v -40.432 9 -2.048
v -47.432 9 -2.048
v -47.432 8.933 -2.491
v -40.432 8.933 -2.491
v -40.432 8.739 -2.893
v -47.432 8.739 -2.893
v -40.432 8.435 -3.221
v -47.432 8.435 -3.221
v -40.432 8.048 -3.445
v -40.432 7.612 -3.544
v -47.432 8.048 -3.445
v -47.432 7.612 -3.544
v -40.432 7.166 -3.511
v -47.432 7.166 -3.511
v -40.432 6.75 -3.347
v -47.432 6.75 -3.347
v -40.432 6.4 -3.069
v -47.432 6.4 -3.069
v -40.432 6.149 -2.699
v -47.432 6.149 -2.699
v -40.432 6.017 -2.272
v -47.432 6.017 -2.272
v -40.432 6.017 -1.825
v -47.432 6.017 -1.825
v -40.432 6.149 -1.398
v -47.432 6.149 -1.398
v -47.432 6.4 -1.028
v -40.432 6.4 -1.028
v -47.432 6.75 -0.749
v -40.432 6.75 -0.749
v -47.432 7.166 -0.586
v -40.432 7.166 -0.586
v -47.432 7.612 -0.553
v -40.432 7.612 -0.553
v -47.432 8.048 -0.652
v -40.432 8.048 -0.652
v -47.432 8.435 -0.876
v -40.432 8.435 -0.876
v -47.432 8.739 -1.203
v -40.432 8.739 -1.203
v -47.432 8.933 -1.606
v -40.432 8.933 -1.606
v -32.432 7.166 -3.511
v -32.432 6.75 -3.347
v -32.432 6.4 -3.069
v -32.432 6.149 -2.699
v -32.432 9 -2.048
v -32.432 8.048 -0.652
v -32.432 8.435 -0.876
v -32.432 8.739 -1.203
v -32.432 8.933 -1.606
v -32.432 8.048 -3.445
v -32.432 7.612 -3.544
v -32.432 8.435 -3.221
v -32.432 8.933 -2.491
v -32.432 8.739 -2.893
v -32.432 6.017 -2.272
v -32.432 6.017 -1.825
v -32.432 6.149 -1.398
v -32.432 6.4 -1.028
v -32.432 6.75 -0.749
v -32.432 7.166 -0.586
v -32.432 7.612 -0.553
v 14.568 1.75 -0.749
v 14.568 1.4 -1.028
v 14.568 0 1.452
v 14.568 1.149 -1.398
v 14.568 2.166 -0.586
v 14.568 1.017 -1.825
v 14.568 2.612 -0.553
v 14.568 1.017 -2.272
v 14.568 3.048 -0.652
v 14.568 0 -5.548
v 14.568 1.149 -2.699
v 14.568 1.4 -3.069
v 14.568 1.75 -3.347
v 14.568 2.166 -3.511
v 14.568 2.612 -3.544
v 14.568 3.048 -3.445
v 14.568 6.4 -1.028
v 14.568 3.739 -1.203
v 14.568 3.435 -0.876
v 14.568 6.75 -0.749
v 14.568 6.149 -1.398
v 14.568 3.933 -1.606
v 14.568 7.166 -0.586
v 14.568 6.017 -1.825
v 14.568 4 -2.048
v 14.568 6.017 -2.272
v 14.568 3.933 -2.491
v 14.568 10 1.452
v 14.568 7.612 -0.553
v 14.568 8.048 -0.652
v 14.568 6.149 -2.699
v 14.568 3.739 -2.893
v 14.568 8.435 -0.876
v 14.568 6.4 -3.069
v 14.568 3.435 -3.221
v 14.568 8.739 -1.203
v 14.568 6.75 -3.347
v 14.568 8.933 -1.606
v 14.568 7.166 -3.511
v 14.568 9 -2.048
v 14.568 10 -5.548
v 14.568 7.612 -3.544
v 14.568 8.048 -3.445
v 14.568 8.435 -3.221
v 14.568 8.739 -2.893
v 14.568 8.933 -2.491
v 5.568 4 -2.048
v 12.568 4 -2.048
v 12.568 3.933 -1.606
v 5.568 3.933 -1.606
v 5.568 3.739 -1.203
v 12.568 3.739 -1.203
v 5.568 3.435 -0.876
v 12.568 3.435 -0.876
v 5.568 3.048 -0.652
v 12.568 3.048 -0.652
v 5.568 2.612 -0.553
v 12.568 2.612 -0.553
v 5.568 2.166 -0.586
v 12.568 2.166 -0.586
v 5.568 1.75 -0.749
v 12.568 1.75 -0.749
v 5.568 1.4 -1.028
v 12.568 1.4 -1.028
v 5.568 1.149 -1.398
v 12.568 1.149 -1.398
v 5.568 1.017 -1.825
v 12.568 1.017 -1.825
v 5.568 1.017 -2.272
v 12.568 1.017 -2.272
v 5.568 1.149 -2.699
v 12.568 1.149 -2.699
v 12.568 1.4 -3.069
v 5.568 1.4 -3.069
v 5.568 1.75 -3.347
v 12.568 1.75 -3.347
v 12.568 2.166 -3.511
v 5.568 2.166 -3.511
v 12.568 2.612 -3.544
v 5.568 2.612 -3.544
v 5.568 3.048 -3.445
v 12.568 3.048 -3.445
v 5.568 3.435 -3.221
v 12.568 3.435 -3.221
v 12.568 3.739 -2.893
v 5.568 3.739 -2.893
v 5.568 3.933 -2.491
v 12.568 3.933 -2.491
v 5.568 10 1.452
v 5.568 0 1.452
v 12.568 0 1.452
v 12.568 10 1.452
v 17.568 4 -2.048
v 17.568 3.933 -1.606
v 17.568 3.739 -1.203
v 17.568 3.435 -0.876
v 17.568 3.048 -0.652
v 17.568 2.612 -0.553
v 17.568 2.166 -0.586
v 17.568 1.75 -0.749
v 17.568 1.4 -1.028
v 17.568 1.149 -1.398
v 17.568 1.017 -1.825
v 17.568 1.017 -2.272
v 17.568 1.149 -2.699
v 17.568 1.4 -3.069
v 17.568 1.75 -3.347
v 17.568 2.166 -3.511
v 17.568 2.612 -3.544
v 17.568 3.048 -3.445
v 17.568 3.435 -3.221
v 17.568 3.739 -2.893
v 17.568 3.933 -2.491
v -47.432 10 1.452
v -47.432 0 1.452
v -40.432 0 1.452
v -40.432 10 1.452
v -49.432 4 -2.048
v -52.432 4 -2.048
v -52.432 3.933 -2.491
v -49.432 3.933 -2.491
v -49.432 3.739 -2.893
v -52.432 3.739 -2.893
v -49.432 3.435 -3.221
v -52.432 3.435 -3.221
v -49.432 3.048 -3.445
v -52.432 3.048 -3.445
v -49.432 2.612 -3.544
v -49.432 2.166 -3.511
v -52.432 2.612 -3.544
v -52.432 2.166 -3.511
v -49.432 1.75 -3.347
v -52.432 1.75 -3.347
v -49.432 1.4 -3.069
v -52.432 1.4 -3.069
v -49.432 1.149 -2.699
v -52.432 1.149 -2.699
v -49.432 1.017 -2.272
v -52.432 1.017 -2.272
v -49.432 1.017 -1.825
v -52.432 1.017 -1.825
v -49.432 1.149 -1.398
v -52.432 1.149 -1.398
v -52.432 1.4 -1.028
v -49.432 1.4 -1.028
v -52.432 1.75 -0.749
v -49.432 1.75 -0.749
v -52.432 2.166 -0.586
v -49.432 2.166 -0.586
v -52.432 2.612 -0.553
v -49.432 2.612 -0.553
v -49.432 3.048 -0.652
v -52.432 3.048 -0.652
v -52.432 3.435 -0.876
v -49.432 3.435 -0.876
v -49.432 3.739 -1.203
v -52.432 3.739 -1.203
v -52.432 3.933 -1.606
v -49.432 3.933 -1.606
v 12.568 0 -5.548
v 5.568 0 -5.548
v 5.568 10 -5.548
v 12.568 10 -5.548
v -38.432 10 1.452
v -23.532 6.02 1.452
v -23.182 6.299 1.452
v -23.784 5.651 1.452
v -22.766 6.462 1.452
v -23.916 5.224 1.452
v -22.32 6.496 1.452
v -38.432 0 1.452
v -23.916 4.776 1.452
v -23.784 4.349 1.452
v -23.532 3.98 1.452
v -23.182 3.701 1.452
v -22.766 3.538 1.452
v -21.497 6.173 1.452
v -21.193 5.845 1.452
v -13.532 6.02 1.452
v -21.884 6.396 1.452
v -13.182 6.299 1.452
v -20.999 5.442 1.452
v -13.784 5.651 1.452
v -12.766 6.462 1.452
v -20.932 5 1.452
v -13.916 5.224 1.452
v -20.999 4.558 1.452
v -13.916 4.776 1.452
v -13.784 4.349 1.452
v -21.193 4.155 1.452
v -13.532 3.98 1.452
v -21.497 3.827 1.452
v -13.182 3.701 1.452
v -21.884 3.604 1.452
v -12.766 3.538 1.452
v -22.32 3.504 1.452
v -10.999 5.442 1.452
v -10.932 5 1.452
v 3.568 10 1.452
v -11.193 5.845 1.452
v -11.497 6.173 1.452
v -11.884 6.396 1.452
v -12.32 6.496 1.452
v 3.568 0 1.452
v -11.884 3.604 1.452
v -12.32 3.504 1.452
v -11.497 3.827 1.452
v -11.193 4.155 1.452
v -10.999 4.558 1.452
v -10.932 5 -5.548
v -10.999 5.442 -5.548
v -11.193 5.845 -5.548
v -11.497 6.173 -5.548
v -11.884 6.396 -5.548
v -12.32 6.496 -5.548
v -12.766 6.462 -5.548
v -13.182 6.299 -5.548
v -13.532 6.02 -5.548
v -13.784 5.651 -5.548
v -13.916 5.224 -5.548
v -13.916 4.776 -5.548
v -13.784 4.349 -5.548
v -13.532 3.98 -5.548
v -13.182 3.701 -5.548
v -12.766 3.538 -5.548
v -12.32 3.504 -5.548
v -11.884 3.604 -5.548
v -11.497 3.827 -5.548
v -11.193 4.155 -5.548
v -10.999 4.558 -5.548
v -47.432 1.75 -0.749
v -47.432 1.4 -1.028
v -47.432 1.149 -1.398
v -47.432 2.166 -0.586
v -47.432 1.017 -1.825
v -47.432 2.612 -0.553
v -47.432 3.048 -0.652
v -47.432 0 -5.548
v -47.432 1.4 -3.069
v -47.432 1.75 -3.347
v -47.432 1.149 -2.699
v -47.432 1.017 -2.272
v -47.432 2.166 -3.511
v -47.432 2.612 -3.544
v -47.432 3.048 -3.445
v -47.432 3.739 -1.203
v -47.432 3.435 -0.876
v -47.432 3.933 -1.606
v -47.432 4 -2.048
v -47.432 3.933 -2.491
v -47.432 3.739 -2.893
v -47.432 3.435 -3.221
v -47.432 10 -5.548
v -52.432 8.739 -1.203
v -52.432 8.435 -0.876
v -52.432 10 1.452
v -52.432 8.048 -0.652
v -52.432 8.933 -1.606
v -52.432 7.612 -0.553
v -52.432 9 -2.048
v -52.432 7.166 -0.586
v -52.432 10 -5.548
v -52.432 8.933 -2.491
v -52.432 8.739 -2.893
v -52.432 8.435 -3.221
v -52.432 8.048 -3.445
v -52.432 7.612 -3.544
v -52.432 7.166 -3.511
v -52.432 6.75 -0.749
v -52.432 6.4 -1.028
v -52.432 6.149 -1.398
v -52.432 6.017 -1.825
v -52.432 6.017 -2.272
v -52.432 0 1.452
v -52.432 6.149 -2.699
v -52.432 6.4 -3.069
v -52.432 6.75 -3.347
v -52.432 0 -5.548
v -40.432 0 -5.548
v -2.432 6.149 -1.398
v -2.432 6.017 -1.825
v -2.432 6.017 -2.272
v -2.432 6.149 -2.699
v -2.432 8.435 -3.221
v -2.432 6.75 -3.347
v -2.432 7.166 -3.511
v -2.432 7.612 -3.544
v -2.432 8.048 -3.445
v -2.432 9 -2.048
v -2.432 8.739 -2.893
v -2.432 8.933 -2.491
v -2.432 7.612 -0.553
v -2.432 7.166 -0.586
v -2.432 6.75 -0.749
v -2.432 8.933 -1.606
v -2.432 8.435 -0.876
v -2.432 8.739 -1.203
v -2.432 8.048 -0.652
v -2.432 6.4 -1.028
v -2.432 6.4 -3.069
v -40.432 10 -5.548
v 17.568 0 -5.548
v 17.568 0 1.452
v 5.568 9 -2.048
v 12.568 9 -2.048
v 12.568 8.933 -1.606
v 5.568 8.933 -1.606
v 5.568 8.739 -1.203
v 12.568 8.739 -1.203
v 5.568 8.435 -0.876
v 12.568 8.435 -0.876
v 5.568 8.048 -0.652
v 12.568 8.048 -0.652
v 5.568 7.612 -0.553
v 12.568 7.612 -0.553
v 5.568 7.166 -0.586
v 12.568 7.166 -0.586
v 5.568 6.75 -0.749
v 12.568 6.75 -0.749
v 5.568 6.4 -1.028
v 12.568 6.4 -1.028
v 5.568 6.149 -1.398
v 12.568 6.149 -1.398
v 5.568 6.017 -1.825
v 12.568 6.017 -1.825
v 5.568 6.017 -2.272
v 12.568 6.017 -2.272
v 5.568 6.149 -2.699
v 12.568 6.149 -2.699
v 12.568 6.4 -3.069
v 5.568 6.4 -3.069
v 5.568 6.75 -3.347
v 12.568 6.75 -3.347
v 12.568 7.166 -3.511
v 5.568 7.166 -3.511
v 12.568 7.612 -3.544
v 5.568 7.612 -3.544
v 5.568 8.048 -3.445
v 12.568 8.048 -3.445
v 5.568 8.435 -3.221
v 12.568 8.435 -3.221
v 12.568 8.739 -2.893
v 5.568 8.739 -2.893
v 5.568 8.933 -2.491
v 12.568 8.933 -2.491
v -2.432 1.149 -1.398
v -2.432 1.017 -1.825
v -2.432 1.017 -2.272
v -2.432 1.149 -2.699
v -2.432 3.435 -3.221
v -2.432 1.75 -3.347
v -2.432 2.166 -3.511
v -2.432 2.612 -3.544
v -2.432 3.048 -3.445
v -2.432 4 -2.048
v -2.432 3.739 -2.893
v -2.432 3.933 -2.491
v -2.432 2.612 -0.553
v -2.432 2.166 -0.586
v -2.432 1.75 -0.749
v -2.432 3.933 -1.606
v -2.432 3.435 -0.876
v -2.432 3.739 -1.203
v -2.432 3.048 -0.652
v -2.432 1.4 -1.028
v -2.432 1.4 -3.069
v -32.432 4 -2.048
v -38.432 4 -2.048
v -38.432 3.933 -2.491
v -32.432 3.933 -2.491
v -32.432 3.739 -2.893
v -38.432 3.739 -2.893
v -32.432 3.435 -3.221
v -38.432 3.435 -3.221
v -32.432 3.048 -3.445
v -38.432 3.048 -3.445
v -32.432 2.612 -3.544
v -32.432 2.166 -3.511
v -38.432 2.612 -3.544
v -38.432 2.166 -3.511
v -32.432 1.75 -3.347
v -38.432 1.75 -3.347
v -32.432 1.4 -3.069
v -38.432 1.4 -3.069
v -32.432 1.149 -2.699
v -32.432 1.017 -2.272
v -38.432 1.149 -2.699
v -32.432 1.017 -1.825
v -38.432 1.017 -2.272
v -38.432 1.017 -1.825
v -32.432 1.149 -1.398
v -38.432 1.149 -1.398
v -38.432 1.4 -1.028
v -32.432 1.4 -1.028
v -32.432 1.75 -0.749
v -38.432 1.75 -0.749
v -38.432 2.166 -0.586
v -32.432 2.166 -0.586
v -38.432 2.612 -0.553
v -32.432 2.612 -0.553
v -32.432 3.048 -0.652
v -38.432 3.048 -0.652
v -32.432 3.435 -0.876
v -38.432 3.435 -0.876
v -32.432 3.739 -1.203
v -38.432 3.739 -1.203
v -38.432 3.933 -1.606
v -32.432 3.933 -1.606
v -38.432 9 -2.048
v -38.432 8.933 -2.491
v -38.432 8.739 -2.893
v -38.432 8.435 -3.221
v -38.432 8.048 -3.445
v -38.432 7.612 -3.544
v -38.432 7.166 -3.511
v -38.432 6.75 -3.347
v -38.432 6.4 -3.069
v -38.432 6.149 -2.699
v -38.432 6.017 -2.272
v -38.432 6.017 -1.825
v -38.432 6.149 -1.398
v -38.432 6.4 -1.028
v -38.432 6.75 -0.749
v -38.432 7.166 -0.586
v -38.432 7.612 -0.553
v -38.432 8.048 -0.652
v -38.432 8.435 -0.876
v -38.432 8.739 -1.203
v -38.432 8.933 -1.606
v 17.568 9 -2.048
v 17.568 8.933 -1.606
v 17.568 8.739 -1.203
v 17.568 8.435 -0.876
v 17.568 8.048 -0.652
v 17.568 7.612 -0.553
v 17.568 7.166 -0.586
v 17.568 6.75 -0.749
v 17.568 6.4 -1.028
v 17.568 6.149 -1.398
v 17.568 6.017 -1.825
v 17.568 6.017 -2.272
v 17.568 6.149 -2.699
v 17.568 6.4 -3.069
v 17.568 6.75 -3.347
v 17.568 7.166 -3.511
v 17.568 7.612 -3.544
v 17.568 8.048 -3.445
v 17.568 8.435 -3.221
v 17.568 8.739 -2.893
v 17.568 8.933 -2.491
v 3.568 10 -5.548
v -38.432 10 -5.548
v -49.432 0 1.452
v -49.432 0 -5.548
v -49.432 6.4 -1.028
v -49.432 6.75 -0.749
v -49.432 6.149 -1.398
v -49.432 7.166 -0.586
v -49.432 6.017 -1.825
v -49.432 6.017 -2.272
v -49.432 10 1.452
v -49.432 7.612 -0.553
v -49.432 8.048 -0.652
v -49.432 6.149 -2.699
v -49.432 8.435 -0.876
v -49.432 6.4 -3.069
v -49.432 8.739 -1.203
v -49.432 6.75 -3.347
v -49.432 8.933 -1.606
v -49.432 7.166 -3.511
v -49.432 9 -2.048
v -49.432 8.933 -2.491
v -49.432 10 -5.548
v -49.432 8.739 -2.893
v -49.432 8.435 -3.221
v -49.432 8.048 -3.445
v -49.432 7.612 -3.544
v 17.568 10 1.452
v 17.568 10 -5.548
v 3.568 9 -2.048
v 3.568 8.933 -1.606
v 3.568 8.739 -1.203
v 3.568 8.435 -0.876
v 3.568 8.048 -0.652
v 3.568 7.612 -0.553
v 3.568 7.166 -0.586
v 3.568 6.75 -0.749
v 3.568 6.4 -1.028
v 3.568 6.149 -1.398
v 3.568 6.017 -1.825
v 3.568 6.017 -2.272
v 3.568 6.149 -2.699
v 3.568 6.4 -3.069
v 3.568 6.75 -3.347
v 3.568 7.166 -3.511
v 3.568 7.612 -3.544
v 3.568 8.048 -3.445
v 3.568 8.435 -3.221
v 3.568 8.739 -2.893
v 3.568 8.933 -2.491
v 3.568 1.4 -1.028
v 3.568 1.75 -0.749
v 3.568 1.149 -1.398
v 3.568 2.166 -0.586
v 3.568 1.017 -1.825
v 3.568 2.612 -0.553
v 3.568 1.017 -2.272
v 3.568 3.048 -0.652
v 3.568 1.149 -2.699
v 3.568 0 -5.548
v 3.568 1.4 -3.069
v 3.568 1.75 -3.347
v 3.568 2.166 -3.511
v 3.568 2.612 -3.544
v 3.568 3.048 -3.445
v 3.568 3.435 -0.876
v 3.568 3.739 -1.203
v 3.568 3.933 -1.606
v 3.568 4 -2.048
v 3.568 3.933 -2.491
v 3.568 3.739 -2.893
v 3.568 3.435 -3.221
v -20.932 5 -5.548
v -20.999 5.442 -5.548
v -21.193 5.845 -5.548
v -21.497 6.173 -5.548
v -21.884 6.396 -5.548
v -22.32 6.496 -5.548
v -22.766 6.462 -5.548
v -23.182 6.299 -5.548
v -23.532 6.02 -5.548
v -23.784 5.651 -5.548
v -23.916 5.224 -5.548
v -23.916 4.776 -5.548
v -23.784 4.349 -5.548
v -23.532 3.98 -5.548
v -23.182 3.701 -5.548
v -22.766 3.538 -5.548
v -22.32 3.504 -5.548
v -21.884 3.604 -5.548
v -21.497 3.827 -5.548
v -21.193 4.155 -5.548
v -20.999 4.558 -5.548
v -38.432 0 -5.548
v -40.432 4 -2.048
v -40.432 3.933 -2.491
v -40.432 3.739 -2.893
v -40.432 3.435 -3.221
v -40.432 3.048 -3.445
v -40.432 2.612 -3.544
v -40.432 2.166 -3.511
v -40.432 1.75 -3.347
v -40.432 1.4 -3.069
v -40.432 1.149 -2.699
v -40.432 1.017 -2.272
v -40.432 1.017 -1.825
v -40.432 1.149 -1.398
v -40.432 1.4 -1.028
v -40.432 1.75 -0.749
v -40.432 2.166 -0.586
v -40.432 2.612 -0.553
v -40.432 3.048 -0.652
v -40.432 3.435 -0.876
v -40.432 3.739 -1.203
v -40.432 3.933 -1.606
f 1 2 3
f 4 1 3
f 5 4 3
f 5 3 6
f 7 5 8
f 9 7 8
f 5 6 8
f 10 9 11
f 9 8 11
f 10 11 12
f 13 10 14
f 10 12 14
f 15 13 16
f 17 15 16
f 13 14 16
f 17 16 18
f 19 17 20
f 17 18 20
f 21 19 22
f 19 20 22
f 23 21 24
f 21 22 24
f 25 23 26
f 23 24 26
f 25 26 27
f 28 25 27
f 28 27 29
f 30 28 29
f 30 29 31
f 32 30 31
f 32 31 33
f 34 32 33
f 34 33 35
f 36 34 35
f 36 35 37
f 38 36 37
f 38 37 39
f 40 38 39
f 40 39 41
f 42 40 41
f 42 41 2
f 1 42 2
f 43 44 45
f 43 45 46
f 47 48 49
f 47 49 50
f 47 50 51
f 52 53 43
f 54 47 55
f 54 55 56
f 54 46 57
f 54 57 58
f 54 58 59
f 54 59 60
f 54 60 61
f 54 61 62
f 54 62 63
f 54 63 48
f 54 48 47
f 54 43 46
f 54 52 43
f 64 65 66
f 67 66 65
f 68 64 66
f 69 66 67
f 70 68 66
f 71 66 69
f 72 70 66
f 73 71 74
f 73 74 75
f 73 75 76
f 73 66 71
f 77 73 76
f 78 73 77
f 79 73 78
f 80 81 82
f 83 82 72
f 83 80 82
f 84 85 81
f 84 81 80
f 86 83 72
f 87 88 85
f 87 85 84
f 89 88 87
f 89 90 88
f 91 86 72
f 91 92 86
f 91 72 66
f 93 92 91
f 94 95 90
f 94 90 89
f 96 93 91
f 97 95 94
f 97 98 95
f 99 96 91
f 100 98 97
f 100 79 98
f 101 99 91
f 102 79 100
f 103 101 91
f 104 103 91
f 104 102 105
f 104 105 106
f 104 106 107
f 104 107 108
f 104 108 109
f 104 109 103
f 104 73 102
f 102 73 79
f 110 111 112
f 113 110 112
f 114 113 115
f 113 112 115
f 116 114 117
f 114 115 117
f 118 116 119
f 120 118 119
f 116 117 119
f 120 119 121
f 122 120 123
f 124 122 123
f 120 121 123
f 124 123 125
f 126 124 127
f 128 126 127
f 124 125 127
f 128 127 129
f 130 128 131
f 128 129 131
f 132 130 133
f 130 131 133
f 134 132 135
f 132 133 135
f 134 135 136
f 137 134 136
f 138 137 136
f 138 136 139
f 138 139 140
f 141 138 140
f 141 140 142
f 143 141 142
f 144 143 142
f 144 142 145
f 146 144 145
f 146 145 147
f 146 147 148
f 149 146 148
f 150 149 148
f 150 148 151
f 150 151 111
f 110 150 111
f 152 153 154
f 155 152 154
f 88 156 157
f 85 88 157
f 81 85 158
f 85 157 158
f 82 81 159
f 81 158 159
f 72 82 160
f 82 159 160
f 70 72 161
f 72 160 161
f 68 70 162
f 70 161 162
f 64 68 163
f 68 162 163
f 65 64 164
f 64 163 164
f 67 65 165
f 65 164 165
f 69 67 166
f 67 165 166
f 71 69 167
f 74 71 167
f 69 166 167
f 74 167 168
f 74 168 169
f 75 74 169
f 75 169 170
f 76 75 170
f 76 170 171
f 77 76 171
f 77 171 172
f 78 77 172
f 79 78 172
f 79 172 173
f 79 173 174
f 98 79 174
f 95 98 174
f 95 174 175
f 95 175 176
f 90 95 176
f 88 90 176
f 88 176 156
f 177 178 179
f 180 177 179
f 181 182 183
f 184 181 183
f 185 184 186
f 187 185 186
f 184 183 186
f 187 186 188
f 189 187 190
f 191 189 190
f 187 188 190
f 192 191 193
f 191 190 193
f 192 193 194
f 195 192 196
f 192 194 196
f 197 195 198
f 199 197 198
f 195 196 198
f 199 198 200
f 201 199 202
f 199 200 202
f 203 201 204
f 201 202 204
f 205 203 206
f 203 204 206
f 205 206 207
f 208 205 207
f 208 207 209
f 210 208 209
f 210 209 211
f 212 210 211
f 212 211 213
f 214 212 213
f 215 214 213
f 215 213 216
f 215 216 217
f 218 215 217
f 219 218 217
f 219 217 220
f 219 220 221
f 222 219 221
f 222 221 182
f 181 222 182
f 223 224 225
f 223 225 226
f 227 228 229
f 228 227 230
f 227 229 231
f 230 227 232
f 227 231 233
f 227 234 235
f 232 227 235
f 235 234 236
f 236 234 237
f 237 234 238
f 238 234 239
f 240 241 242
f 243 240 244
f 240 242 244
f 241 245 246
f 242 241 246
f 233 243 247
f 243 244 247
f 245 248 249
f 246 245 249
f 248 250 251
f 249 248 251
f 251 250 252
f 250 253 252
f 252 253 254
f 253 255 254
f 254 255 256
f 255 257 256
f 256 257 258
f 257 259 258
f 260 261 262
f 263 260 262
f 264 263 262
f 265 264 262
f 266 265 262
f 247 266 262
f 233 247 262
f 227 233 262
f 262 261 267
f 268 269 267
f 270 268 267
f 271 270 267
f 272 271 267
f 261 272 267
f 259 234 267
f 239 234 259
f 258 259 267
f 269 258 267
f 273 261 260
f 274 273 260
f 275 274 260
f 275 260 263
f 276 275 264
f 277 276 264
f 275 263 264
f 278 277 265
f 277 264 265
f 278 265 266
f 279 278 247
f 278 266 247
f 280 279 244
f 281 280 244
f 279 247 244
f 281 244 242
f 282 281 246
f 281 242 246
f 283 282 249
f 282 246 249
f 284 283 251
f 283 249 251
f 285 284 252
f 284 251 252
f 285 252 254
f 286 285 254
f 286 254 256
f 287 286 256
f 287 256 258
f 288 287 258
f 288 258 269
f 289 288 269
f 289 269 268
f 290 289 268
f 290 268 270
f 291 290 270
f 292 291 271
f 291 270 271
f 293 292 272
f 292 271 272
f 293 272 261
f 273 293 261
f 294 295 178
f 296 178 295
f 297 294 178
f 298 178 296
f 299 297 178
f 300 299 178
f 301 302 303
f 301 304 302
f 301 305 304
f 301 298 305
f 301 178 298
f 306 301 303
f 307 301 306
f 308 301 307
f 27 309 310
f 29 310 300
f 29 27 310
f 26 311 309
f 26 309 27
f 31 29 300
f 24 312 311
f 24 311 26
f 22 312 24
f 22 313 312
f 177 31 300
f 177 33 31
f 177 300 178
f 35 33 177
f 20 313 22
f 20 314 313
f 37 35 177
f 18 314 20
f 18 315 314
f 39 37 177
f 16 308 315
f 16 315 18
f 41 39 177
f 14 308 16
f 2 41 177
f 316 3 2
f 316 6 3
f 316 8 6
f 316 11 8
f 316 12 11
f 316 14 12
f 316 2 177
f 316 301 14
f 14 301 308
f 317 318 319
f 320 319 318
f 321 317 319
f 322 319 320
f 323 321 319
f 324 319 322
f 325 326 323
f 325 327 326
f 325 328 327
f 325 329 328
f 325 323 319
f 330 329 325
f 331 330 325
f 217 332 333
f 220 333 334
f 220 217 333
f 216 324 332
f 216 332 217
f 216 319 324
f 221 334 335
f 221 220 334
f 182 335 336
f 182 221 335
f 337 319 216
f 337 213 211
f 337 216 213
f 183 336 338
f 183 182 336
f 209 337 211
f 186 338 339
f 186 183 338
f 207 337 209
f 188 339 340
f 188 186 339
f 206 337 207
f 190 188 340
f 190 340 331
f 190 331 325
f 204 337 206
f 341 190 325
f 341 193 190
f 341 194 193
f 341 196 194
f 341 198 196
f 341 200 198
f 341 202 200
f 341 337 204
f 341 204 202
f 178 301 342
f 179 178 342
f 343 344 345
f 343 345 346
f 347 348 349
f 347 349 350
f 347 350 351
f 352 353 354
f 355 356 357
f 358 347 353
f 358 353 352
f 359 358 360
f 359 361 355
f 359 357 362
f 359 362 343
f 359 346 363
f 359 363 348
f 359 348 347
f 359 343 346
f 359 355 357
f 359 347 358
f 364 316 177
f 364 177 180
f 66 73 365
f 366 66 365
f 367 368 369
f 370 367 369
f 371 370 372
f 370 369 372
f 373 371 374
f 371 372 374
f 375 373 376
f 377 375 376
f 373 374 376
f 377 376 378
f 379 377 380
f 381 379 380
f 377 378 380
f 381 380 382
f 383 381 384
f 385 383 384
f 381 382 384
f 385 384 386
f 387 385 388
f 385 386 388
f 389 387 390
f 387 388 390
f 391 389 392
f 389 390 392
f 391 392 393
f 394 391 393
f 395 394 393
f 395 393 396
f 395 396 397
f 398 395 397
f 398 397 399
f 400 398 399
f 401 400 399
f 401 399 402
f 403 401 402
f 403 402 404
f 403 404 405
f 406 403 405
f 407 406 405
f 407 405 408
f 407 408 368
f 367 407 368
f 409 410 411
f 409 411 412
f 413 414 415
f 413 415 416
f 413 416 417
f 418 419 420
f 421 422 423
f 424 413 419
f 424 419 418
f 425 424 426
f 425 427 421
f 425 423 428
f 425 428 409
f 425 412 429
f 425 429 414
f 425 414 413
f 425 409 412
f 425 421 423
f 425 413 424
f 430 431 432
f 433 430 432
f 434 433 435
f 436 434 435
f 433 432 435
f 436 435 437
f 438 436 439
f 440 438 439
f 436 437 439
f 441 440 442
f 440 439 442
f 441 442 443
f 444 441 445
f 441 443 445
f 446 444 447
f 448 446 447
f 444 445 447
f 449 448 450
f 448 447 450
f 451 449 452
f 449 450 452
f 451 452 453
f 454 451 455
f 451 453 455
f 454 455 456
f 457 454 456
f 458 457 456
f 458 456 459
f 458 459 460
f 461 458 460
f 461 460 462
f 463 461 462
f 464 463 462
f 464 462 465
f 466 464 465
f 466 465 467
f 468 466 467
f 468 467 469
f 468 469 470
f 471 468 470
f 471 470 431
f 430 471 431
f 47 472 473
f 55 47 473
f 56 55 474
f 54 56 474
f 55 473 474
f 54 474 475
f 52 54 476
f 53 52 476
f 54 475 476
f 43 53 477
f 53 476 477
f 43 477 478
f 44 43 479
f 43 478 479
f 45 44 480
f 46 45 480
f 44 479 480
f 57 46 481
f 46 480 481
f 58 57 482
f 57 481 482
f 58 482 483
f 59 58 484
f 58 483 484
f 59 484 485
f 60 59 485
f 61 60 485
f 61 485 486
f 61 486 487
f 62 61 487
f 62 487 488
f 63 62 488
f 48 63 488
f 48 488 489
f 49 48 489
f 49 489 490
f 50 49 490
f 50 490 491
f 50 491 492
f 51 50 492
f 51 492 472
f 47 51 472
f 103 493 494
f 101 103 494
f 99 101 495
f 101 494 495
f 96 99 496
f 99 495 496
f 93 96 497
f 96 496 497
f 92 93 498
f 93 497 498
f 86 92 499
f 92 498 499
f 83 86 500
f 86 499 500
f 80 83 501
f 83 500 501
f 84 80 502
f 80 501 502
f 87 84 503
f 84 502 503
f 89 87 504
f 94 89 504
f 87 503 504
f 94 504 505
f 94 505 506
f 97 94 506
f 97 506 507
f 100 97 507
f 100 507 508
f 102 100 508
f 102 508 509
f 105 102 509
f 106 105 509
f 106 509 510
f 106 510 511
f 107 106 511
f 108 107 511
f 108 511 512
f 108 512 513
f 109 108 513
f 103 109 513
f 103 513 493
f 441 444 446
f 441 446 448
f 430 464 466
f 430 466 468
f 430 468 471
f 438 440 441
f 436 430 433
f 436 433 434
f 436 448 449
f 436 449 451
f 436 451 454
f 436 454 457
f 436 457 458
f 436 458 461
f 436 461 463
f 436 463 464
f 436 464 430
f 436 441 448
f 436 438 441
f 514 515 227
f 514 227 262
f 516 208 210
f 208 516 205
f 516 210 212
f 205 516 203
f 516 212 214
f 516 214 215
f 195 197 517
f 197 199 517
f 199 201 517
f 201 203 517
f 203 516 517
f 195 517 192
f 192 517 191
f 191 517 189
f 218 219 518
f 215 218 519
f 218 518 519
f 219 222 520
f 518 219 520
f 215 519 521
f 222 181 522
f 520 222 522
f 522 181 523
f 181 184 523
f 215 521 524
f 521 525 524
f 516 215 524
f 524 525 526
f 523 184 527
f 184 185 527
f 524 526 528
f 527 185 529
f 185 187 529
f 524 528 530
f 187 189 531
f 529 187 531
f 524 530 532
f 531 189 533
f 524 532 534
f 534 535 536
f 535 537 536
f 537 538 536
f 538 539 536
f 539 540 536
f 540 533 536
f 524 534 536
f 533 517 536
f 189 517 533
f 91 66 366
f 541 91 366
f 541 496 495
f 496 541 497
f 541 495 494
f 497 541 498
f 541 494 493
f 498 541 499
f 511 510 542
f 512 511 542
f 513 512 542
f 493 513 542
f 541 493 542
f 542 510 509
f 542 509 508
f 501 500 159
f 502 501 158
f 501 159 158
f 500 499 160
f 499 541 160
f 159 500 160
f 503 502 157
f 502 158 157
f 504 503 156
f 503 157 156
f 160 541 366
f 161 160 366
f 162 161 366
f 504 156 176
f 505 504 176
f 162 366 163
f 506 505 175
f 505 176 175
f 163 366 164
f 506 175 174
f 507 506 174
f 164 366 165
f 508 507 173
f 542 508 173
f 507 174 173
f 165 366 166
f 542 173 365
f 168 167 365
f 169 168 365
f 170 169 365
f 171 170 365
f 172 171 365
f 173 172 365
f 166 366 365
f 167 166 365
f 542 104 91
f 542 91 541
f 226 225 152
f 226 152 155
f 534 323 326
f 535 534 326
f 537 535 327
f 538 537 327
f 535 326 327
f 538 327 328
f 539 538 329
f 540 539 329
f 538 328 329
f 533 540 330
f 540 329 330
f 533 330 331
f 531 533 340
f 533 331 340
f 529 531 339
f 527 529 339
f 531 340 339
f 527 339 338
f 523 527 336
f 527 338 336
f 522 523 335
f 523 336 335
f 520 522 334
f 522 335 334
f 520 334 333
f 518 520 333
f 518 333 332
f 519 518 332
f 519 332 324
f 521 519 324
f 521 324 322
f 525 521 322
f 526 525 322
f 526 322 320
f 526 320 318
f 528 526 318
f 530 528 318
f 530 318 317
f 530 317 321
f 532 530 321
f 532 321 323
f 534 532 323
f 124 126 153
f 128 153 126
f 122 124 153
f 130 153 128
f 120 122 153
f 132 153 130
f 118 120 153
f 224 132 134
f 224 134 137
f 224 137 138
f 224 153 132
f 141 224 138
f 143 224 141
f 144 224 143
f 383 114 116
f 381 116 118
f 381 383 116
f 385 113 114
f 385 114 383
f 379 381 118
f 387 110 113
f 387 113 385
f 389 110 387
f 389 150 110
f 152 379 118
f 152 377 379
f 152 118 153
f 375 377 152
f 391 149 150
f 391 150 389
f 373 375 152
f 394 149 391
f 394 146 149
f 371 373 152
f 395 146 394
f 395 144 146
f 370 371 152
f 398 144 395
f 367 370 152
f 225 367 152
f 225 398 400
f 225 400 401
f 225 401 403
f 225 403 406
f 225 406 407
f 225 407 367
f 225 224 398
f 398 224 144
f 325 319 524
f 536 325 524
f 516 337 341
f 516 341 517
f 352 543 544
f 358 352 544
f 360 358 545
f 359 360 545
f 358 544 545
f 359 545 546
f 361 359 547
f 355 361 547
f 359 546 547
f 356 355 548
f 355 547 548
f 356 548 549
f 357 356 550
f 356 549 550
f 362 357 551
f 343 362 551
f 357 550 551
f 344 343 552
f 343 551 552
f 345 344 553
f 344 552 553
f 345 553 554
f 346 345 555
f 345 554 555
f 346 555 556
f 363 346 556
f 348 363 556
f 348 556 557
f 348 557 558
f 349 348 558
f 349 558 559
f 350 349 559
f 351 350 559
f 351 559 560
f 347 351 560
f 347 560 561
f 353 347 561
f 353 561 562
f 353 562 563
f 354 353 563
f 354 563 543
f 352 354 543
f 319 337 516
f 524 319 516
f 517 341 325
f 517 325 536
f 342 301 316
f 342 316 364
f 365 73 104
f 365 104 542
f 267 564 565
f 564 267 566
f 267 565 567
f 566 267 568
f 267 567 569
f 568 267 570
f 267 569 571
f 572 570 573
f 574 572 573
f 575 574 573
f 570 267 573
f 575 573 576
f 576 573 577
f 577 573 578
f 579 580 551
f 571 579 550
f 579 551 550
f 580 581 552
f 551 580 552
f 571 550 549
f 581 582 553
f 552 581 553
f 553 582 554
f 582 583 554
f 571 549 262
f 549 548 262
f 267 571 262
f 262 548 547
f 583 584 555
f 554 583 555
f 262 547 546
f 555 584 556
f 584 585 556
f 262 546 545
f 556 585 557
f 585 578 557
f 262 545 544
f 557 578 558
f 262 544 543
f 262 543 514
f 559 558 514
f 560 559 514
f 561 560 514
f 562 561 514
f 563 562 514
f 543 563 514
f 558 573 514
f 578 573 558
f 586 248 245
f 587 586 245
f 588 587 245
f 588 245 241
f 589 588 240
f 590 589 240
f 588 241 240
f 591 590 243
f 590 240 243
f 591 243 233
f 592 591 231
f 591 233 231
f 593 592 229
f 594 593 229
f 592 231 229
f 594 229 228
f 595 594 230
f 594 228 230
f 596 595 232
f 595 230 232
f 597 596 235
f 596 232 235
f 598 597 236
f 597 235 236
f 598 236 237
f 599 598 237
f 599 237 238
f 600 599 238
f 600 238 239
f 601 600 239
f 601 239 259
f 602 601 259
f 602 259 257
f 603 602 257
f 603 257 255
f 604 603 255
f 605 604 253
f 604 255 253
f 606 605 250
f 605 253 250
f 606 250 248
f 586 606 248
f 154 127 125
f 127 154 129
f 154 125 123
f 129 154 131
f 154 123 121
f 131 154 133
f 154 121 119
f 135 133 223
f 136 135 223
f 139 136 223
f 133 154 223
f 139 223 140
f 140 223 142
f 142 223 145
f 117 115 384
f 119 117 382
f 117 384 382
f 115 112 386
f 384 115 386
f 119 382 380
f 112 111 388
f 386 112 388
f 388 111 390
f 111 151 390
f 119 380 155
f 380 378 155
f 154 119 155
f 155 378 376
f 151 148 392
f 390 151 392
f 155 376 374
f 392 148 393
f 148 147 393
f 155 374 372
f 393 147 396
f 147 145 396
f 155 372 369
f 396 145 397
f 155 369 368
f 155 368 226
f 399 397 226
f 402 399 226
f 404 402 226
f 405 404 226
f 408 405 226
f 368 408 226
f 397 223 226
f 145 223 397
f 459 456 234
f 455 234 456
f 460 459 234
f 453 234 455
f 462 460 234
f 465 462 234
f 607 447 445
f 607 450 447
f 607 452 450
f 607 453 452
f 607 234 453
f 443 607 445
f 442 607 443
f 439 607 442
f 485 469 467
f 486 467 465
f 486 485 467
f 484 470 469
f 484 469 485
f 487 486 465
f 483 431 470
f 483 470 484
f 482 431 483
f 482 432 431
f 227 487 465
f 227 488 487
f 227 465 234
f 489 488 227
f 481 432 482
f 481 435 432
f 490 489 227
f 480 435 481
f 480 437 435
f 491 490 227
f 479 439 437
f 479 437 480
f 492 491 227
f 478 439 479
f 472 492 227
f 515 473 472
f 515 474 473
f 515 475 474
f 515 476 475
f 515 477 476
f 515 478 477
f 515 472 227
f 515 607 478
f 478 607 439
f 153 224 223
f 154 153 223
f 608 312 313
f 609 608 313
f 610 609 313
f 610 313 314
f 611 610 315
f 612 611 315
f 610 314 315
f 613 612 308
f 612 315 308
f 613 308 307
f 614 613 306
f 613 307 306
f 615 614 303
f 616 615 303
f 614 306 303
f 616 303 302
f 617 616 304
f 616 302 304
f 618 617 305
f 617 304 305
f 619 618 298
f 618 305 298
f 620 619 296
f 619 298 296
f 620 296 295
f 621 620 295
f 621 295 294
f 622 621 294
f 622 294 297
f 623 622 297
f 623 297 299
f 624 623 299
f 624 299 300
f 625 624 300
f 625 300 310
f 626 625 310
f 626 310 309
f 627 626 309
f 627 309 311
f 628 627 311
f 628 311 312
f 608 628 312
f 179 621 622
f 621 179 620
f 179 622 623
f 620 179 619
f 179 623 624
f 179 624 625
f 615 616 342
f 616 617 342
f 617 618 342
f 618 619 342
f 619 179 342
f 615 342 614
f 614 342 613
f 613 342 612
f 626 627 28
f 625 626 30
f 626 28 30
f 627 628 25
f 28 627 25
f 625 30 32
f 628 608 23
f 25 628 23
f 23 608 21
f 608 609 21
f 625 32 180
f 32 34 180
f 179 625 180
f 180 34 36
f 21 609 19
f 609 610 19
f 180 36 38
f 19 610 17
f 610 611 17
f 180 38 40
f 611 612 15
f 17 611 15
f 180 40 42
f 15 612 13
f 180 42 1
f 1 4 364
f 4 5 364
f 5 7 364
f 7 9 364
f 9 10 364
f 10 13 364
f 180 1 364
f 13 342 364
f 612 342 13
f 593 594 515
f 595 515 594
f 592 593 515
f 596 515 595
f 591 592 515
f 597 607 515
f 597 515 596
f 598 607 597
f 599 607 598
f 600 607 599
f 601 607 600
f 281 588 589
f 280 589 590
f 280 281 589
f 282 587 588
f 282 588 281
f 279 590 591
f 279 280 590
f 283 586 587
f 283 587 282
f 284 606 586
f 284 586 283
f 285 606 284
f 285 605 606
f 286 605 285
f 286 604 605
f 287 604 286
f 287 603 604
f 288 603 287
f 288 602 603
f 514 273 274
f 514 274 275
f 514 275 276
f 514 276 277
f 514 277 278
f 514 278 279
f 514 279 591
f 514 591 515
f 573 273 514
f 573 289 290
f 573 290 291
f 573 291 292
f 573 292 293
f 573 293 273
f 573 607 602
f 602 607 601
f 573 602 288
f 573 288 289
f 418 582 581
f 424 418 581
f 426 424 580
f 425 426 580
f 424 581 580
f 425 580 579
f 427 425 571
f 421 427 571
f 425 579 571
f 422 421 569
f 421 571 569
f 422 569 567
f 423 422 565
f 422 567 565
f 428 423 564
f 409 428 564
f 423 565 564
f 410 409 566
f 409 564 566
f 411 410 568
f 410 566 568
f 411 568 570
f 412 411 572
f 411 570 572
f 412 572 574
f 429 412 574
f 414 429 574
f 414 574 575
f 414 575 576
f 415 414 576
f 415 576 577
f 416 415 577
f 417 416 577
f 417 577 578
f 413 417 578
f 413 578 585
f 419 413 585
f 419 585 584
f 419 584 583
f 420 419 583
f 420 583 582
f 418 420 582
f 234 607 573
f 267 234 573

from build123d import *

# Parameters (mm, degrees)
SKETCH_1_W          = 70
SKETCH_1_H          = 7
EXTRUDE_1_DEPTH     = 10
SKETCH_2_W          = 2
SKETCH_2_H          = 10
CUT_EXTRUDE_1_DEPTH = 7
SKETCH_4_R          = 1.5
CUT_EXTRUDE_2_DEPTH = 20
SKETCH_5_R          = 1.5
CUT_EXTRUDE_3_DEPTH = 20
SKETCH_6_R          = 1.5
CUT_EXTRUDE_4_DEPTH = 7


with BuildPart() as part:
    # Эскиз1 → Бобышка-Вытянуть1 (new body)
    with BuildSketch(Plane(origin=(0, 0, 0), x_dir=(1, 0, 0), z_dir=(0, 1, 0))):
        with Locations((-17.432449075, 2.048422225)):
            Rectangle(SKETCH_1_W, SKETCH_1_H)
    extrude(amount=EXTRUDE_1_DEPTH)

    # Эскиз2 → Вырез-Вытянуть1 (cut)
    with BuildSketch(Plane(origin=(0, 0, -5.548422225), x_dir=(-1, 0, 0), z_dir=(0, 0, -1))):
        with Locations((-13.567550925, 5)):
            Rectangle(SKETCH_2_W, SKETCH_2_H)
        with Locations((48.432449075, 5)):
            Rectangle(SKETCH_2_W, SKETCH_2_H)
        with Locations((39.432449075, 5)):
            Rectangle(SKETCH_2_W, SKETCH_2_H)
        with Locations((-4.567550925, 5)):
            Rectangle(SKETCH_2_W, SKETCH_2_H)
    extrude(amount=-CUT_EXTRUDE_1_DEPTH, mode=Mode.SUBTRACT)


with BuildPart() as cut_extrude_1_piece_1:
    # of the separate pieces the step leaves, piece 1, a body of its own (cut_extrude_1_pieces)
    add(part.part.solids().sort_by_distance((-38.432449075, 0, -5.548422225))[0])


with BuildPart() as cut_extrude_1_piece_2:
    # of the separate pieces the step leaves, piece 2, a body of its own (cut_extrude_1_pieces)
    add(part.part.solids().sort_by_distance((5.567550925, 0, -5.548422225))[0])


with BuildPart() as cut_extrude_1_piece_3:
    # of the separate pieces the step leaves, piece 3, a body of its own (cut_extrude_1_pieces)
    add(part.part.solids().sort_by_distance((-47.432449075, 0, -5.548422225))[0])


with BuildPart() as cut_extrude_1_piece_4:
    # of the separate pieces the step leaves, piece 4, a body of its own (cut_extrude_1_pieces)
    add(part.part.solids().sort_by_distance((-52.432449075, 0, -5.548422225))[0])


with BuildPart() as cut_extrude_1_piece_5:
    # of the separate pieces the step leaves, piece 5, a body of its own (cut_extrude_1_pieces)
    add(part.part.solids().sort_by_distance((14.567550925, 0, -5.548422225))[0])


with BuildPart() as cut_extrude_2_tool:
    # Эскиз4 → Вырез-Вытянуть2 (new body)
    with BuildSketch(Plane(origin=(17.567550925, 0, 0), x_dir=(0, 0, -1), z_dir=(1, 0, 0))):
        with Locations(Location((2.048422225, 7.5, 0), (0, 0, 90))):
            Circle(SKETCH_4_R)
        with Locations(Location((2.048422225, 2.5, 0), (0, 0, 90))):
            Circle(SKETCH_4_R)
    extrude(amount=-CUT_EXTRUDE_2_DEPTH)


with BuildPart() as cut_extrude_1_piece_1_1:
    add(cut_extrude_1_piece_1.part)

    # Вырез-Вытянуть2: cut by cut_extrude_2_tool
    add(cut_extrude_2_tool.part, mode=Mode.SUBTRACT)


with BuildPart() as cut_extrude_1_piece_2_1:
    add(cut_extrude_1_piece_2.part)

    # Вырез-Вытянуть2: cut by cut_extrude_2_tool
    add(cut_extrude_2_tool.part, mode=Mode.SUBTRACT)


with BuildPart() as cut_extrude_1_piece_5_1:
    add(cut_extrude_1_piece_5.part)

    # Вырез-Вытянуть2: cut by cut_extrude_2_tool
    add(cut_extrude_2_tool.part, mode=Mode.SUBTRACT)


with BuildPart() as cut_extrude_3_tool:
    # Эскиз5 → Вырез-Вытянуть3 (new body)
    with BuildSketch(Plane.ZY.offset(52.432449075)):
        with Locations(Location((-2.048422225, 7.5, 0), (0, 0, 90))):
            Circle(SKETCH_5_R)
        with Locations(Location((-2.048422225, 2.5, 0), (0, 0, 90))):
            Circle(SKETCH_5_R)
    extrude(amount=-CUT_EXTRUDE_3_DEPTH)


with BuildPart() as cut_extrude_1_piece_1_2:
    add(cut_extrude_1_piece_1_1.part)

    # Вырез-Вытянуть3: cut by cut_extrude_3_tool
    add(cut_extrude_3_tool.part, mode=Mode.SUBTRACT)

    # Эскиз6 → Вырез-Вытянуть4 (cut)
    with BuildSketch(Plane.XY.offset(1.451577775)):
        with Locations((-22.432449075, 5)):
            Circle(SKETCH_6_R)
        with Locations((-12.432449075, 5)):
            Circle(SKETCH_6_R)
    extrude(amount=-CUT_EXTRUDE_4_DEPTH, mode=Mode.SUBTRACT)


with BuildPart() as cut_extrude_1_piece_3_1:
    add(cut_extrude_1_piece_3.part)

    # Вырез-Вытянуть3: cut by cut_extrude_3_tool
    add(cut_extrude_3_tool.part, mode=Mode.SUBTRACT)


with BuildPart() as cut_extrude_1_piece_4_1:
    add(cut_extrude_1_piece_4.part)

    # Вырез-Вытянуть3: cut by cut_extrude_3_tool
    add(cut_extrude_3_tool.part, mode=Mode.SUBTRACT)


solid = Compound([cut_extrude_1_piece_2_1.part, cut_extrude_1_piece_5_1.part, cut_extrude_1_piece_1_2.part, cut_extrude_1_piece_3_1.part, cut_extrude_1_piece_4_1.part])
